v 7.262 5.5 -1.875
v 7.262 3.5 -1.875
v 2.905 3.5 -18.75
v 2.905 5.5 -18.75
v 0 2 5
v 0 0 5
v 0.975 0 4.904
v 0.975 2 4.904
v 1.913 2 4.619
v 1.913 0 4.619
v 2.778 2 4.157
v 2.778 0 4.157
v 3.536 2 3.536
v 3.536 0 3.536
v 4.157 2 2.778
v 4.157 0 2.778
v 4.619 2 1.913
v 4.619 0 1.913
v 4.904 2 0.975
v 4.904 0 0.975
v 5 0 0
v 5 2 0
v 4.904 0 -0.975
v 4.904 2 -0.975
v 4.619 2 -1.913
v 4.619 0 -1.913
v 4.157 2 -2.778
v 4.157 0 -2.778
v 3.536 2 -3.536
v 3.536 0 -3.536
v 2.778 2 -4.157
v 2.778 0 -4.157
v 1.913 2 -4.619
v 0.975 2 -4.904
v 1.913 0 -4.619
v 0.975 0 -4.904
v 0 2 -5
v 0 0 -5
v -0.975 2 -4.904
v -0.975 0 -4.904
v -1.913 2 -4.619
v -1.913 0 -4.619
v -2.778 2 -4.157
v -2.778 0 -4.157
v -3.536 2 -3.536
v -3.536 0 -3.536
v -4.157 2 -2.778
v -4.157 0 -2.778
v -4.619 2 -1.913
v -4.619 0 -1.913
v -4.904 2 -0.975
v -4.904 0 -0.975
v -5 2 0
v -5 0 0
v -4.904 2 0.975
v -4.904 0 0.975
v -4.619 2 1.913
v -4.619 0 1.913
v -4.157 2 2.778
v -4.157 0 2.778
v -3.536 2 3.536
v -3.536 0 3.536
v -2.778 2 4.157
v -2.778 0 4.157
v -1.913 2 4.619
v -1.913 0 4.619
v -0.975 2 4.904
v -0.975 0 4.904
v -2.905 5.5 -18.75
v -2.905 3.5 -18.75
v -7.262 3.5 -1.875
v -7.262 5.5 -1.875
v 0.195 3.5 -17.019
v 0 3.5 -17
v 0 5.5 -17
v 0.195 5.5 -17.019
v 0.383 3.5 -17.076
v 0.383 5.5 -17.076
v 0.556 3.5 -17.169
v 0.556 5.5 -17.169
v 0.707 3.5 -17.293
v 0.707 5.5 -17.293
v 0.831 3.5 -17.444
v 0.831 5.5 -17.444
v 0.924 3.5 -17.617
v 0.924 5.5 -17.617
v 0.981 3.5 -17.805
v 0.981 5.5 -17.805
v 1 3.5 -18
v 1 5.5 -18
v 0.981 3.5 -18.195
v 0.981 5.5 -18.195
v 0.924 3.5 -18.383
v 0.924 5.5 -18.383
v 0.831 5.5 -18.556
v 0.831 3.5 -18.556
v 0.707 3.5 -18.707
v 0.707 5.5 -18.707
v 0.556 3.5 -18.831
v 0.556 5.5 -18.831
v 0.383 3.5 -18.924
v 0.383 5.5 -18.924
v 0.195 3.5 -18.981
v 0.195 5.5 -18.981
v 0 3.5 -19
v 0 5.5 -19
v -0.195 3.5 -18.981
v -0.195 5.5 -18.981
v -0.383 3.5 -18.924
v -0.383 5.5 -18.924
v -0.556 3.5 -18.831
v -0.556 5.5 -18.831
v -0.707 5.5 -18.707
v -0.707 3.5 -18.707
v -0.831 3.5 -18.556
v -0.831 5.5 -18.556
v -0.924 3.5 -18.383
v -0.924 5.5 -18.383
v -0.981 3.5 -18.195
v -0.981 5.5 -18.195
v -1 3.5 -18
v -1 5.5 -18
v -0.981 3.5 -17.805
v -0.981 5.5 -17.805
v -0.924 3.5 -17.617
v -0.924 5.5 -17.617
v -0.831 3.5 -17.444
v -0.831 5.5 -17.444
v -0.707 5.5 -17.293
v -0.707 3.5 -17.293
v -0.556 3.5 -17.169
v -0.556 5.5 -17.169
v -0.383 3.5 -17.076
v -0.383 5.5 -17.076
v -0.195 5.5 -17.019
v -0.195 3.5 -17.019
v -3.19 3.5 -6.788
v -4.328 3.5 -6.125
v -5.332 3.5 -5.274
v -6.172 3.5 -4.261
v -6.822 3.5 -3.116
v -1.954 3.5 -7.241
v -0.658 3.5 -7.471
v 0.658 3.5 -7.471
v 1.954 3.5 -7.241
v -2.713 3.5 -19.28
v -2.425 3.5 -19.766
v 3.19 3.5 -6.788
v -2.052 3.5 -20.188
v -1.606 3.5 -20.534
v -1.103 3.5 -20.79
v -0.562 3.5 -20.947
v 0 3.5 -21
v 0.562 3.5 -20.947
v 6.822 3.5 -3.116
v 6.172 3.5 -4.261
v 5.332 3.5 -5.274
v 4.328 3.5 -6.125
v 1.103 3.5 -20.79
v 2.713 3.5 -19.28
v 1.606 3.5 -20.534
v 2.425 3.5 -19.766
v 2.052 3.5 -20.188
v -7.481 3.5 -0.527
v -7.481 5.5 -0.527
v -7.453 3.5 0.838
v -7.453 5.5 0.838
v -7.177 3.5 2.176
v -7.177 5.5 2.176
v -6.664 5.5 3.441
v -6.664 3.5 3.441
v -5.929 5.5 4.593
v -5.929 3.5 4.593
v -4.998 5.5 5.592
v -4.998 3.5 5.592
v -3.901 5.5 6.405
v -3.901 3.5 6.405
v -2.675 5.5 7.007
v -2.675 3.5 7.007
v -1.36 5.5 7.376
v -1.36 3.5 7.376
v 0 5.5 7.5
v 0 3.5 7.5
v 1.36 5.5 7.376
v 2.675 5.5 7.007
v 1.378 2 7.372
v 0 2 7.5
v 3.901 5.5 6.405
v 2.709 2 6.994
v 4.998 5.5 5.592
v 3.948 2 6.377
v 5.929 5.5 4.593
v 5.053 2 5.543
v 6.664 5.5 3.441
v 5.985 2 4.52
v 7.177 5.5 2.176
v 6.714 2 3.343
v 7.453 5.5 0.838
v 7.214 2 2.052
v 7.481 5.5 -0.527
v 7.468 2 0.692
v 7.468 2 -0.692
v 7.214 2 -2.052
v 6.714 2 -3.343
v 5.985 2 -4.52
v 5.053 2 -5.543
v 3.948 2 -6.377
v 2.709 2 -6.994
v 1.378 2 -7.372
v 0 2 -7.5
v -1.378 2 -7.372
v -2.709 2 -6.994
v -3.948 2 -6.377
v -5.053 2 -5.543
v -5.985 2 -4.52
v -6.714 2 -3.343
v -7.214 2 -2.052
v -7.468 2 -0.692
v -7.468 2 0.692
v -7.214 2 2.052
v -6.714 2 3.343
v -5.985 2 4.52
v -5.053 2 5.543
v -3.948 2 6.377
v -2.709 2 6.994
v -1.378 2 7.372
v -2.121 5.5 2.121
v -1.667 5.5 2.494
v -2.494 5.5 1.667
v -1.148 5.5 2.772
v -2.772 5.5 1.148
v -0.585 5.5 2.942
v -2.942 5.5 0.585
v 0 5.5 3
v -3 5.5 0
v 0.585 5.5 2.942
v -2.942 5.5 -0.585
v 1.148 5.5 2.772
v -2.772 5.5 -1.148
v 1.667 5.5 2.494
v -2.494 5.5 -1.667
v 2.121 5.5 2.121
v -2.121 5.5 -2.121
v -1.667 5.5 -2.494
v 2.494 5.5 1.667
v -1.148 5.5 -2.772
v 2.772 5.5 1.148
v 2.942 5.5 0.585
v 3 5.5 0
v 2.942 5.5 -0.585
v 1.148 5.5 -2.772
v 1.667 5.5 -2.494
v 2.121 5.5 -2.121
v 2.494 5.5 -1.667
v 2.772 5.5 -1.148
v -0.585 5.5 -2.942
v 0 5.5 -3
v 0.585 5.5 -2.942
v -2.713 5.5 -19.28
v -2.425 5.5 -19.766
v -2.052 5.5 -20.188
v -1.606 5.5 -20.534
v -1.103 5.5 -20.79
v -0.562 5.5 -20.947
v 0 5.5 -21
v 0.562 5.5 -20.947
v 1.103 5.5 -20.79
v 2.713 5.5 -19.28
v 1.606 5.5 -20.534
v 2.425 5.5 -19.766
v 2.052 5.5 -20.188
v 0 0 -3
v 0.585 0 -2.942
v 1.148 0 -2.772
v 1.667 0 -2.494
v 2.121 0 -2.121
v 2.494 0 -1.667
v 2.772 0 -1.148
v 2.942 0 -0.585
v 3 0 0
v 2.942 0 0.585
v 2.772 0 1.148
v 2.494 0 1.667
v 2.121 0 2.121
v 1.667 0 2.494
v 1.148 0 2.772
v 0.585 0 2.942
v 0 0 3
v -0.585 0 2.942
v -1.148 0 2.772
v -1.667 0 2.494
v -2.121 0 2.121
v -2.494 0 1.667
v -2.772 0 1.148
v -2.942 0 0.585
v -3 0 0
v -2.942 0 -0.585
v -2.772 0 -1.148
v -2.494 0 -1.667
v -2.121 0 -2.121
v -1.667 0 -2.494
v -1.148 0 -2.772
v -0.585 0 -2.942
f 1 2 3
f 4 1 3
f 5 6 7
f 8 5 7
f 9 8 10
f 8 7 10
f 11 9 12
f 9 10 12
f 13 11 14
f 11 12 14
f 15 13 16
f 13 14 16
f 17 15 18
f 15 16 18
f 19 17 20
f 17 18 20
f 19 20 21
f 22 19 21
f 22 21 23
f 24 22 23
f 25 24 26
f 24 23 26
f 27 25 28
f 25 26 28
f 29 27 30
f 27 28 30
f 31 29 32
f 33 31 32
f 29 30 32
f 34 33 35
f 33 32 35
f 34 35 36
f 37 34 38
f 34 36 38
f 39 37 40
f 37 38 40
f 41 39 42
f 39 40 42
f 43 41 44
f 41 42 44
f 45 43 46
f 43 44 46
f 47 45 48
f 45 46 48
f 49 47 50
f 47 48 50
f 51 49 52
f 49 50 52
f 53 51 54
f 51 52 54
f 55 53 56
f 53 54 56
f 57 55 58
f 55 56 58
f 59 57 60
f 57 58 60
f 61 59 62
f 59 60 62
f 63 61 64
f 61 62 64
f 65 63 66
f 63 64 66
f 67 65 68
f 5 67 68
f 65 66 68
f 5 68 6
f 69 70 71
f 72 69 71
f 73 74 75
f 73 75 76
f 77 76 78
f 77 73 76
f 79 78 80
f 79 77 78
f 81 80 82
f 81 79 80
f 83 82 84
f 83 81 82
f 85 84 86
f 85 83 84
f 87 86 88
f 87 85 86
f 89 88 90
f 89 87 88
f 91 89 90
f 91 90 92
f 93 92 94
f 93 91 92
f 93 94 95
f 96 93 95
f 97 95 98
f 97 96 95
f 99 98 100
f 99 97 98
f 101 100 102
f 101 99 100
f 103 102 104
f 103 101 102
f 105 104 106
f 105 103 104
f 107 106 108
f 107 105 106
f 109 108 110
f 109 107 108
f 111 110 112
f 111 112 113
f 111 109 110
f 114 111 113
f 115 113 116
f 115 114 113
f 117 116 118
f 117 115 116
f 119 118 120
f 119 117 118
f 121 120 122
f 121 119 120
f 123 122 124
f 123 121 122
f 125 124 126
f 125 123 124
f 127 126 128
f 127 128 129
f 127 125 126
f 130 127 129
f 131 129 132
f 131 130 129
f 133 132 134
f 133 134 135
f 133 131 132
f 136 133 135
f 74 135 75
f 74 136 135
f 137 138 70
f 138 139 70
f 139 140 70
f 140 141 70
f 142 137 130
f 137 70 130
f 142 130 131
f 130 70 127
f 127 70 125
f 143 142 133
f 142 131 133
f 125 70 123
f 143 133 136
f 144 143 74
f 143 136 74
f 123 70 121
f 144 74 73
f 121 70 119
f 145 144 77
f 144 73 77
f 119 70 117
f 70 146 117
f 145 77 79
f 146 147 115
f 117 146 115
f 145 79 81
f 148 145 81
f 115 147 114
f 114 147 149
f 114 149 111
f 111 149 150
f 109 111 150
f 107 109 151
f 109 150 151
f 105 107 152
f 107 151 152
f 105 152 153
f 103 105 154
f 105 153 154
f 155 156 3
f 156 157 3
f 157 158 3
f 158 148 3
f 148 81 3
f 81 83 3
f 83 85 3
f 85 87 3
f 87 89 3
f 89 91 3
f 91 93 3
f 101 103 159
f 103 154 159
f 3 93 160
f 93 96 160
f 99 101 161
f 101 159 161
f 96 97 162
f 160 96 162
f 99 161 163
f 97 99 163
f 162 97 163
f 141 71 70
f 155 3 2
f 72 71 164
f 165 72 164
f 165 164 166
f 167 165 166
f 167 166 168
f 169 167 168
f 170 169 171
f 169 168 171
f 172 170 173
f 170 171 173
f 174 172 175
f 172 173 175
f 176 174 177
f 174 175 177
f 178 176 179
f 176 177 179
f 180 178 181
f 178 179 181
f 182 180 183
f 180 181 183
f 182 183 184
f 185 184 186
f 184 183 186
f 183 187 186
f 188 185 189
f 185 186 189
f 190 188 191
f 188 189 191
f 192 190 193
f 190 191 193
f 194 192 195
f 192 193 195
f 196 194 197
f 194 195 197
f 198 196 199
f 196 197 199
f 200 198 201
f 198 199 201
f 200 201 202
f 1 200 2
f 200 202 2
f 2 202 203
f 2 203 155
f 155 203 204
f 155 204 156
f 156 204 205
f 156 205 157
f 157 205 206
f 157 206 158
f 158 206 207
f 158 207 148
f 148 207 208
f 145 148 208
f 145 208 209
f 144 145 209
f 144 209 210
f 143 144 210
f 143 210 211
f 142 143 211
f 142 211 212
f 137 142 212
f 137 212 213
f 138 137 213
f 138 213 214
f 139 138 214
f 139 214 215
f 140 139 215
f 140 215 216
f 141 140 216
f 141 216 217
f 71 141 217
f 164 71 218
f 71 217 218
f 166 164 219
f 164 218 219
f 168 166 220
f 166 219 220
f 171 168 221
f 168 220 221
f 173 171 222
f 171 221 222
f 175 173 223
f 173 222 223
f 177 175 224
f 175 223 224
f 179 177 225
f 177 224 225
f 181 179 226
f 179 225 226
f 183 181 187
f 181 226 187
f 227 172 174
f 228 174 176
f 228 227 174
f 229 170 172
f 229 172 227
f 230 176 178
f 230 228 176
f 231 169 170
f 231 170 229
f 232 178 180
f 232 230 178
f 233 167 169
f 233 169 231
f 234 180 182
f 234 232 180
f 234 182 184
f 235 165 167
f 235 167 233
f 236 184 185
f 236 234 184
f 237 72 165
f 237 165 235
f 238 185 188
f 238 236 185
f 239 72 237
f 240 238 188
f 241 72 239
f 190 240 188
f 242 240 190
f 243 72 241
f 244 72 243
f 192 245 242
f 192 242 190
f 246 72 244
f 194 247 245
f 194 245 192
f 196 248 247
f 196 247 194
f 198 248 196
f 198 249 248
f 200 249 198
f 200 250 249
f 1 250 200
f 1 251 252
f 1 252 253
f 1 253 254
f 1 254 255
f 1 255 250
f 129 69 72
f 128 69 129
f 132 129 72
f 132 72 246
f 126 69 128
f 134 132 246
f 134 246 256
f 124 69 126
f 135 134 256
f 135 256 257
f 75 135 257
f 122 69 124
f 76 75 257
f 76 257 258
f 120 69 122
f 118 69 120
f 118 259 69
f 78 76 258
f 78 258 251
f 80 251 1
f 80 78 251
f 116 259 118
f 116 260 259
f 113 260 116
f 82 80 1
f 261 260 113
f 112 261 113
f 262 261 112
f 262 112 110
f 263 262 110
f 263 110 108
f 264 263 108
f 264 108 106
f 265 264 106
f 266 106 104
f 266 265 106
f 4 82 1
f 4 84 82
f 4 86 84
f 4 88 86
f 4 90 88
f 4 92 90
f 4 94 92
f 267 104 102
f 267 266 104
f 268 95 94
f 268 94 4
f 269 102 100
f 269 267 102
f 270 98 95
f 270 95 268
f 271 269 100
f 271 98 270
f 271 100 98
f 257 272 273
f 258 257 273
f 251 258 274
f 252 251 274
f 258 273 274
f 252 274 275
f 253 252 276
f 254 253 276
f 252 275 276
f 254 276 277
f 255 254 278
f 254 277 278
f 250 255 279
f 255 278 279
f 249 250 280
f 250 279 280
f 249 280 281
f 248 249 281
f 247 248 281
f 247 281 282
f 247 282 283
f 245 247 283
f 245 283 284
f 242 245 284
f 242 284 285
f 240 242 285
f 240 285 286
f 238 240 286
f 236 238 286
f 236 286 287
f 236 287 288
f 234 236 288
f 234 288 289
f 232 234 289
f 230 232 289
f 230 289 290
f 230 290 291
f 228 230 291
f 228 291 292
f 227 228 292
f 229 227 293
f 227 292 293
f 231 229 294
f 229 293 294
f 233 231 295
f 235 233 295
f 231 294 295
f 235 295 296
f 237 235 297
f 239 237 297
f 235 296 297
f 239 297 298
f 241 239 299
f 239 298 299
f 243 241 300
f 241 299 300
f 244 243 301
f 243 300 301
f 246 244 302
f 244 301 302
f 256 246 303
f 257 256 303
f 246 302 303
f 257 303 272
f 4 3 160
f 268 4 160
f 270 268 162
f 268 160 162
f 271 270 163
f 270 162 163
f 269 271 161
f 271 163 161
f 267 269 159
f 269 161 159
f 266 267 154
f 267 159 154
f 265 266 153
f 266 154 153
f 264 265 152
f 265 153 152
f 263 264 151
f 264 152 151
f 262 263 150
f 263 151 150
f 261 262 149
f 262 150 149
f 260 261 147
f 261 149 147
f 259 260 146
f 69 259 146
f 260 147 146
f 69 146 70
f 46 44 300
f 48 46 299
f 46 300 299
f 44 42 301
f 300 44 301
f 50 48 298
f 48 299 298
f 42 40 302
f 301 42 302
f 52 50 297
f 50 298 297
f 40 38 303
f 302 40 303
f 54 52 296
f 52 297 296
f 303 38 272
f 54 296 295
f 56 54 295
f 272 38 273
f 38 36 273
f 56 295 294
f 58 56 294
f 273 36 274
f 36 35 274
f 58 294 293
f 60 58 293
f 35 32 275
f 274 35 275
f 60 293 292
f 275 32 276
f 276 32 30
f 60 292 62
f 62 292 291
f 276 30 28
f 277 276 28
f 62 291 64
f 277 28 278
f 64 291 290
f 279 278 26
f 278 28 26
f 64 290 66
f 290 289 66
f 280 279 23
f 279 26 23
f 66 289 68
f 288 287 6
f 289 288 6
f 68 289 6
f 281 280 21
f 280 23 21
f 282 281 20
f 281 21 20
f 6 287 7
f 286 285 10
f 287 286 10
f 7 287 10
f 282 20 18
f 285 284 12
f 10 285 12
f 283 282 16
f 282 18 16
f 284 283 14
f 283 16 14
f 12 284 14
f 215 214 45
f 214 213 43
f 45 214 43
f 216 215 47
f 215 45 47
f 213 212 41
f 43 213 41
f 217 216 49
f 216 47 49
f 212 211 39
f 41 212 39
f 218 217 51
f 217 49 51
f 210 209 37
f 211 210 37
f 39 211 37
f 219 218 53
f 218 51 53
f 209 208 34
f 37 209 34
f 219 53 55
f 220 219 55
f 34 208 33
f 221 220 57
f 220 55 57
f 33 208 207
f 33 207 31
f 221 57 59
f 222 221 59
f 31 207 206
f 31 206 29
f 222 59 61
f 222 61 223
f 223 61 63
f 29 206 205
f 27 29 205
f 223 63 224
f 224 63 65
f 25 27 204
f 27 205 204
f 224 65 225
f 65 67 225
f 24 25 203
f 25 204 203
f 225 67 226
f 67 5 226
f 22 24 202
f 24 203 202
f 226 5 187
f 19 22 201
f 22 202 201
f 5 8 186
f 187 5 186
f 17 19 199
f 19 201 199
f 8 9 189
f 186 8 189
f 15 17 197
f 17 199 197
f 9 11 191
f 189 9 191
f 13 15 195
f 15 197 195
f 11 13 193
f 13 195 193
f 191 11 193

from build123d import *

# Parameters (mm, degrees)
SKETCH_1_R          = 5
EXTRUDE_1_DEPTH     = 2
SKETCH_2_R          = 7.5
EXTRUDE_2_DEPTH     = 1.5
SKETCH_3_R          = 1
EXTRUDE_3_DEPTH     = 2
SKETCH_4_R          = 3
CUT_EXTRUDE_1_DEPTH = 23.967368156


with BuildPart() as part:
    # 草图1 → 凸台-拉伸1 (new body)
    with BuildSketch(Plane(origin=(0, 0, 0), x_dir=(1, 0, 0), z_dir=(0, 1, 0))):
        with Locations(Location((0, 0, 0), (0, 0, 270))):
            Circle(SKETCH_1_R)
    extrude(amount=EXTRUDE_1_DEPTH)

    # 草图2 → 凸台-拉伸2 (add)
    with BuildSketch(Plane(origin=(0, 2, 0), x_dir=(1, 0, 0), z_dir=(0, 1, 0))):
        with Locations(Location((0, 0, 0), (0, 0, 270))):
            Circle(SKETCH_2_R)
    extrude(amount=EXTRUDE_2_DEPTH)

    # 草图3 → 凸台-拉伸3 (add)
    with BuildSketch(Plane(origin=(0, 3.5, 0), x_dir=(1, 0, 0), z_dir=(0, 1, 0))):
        with BuildLine():
            Line((-2.90473751, 18.75), (-7.261843774, 1.875))
            ThreePointArc((-7.261843774, 1.875), (0, -7.5), (7.261843774, 1.875))
            Line((7.261843774, 1.875), (2.90473751, 18.75))
            ThreePointArc((2.90473751, 18.75), (0, 21), (-2.90473751, 18.75))
        make_face()
        with Locations(Location((0, 18, 0), (0, 0, 270))):
            Circle(SKETCH_3_R, mode=Mode.SUBTRACT)
    extrude(amount=EXTRUDE_3_DEPTH)

    # 草图4 → 切除-拉伸1 (cut, through all)
    with BuildSketch(Plane.XZ):
        with Locations(Location((0, 0, 0), (0, 0, 270))):
            Circle(SKETCH_4_R)
    extrude(amount=-CUT_EXTRUDE_1_DEPTH, mode=Mode.SUBTRACT)


solid = part.part
